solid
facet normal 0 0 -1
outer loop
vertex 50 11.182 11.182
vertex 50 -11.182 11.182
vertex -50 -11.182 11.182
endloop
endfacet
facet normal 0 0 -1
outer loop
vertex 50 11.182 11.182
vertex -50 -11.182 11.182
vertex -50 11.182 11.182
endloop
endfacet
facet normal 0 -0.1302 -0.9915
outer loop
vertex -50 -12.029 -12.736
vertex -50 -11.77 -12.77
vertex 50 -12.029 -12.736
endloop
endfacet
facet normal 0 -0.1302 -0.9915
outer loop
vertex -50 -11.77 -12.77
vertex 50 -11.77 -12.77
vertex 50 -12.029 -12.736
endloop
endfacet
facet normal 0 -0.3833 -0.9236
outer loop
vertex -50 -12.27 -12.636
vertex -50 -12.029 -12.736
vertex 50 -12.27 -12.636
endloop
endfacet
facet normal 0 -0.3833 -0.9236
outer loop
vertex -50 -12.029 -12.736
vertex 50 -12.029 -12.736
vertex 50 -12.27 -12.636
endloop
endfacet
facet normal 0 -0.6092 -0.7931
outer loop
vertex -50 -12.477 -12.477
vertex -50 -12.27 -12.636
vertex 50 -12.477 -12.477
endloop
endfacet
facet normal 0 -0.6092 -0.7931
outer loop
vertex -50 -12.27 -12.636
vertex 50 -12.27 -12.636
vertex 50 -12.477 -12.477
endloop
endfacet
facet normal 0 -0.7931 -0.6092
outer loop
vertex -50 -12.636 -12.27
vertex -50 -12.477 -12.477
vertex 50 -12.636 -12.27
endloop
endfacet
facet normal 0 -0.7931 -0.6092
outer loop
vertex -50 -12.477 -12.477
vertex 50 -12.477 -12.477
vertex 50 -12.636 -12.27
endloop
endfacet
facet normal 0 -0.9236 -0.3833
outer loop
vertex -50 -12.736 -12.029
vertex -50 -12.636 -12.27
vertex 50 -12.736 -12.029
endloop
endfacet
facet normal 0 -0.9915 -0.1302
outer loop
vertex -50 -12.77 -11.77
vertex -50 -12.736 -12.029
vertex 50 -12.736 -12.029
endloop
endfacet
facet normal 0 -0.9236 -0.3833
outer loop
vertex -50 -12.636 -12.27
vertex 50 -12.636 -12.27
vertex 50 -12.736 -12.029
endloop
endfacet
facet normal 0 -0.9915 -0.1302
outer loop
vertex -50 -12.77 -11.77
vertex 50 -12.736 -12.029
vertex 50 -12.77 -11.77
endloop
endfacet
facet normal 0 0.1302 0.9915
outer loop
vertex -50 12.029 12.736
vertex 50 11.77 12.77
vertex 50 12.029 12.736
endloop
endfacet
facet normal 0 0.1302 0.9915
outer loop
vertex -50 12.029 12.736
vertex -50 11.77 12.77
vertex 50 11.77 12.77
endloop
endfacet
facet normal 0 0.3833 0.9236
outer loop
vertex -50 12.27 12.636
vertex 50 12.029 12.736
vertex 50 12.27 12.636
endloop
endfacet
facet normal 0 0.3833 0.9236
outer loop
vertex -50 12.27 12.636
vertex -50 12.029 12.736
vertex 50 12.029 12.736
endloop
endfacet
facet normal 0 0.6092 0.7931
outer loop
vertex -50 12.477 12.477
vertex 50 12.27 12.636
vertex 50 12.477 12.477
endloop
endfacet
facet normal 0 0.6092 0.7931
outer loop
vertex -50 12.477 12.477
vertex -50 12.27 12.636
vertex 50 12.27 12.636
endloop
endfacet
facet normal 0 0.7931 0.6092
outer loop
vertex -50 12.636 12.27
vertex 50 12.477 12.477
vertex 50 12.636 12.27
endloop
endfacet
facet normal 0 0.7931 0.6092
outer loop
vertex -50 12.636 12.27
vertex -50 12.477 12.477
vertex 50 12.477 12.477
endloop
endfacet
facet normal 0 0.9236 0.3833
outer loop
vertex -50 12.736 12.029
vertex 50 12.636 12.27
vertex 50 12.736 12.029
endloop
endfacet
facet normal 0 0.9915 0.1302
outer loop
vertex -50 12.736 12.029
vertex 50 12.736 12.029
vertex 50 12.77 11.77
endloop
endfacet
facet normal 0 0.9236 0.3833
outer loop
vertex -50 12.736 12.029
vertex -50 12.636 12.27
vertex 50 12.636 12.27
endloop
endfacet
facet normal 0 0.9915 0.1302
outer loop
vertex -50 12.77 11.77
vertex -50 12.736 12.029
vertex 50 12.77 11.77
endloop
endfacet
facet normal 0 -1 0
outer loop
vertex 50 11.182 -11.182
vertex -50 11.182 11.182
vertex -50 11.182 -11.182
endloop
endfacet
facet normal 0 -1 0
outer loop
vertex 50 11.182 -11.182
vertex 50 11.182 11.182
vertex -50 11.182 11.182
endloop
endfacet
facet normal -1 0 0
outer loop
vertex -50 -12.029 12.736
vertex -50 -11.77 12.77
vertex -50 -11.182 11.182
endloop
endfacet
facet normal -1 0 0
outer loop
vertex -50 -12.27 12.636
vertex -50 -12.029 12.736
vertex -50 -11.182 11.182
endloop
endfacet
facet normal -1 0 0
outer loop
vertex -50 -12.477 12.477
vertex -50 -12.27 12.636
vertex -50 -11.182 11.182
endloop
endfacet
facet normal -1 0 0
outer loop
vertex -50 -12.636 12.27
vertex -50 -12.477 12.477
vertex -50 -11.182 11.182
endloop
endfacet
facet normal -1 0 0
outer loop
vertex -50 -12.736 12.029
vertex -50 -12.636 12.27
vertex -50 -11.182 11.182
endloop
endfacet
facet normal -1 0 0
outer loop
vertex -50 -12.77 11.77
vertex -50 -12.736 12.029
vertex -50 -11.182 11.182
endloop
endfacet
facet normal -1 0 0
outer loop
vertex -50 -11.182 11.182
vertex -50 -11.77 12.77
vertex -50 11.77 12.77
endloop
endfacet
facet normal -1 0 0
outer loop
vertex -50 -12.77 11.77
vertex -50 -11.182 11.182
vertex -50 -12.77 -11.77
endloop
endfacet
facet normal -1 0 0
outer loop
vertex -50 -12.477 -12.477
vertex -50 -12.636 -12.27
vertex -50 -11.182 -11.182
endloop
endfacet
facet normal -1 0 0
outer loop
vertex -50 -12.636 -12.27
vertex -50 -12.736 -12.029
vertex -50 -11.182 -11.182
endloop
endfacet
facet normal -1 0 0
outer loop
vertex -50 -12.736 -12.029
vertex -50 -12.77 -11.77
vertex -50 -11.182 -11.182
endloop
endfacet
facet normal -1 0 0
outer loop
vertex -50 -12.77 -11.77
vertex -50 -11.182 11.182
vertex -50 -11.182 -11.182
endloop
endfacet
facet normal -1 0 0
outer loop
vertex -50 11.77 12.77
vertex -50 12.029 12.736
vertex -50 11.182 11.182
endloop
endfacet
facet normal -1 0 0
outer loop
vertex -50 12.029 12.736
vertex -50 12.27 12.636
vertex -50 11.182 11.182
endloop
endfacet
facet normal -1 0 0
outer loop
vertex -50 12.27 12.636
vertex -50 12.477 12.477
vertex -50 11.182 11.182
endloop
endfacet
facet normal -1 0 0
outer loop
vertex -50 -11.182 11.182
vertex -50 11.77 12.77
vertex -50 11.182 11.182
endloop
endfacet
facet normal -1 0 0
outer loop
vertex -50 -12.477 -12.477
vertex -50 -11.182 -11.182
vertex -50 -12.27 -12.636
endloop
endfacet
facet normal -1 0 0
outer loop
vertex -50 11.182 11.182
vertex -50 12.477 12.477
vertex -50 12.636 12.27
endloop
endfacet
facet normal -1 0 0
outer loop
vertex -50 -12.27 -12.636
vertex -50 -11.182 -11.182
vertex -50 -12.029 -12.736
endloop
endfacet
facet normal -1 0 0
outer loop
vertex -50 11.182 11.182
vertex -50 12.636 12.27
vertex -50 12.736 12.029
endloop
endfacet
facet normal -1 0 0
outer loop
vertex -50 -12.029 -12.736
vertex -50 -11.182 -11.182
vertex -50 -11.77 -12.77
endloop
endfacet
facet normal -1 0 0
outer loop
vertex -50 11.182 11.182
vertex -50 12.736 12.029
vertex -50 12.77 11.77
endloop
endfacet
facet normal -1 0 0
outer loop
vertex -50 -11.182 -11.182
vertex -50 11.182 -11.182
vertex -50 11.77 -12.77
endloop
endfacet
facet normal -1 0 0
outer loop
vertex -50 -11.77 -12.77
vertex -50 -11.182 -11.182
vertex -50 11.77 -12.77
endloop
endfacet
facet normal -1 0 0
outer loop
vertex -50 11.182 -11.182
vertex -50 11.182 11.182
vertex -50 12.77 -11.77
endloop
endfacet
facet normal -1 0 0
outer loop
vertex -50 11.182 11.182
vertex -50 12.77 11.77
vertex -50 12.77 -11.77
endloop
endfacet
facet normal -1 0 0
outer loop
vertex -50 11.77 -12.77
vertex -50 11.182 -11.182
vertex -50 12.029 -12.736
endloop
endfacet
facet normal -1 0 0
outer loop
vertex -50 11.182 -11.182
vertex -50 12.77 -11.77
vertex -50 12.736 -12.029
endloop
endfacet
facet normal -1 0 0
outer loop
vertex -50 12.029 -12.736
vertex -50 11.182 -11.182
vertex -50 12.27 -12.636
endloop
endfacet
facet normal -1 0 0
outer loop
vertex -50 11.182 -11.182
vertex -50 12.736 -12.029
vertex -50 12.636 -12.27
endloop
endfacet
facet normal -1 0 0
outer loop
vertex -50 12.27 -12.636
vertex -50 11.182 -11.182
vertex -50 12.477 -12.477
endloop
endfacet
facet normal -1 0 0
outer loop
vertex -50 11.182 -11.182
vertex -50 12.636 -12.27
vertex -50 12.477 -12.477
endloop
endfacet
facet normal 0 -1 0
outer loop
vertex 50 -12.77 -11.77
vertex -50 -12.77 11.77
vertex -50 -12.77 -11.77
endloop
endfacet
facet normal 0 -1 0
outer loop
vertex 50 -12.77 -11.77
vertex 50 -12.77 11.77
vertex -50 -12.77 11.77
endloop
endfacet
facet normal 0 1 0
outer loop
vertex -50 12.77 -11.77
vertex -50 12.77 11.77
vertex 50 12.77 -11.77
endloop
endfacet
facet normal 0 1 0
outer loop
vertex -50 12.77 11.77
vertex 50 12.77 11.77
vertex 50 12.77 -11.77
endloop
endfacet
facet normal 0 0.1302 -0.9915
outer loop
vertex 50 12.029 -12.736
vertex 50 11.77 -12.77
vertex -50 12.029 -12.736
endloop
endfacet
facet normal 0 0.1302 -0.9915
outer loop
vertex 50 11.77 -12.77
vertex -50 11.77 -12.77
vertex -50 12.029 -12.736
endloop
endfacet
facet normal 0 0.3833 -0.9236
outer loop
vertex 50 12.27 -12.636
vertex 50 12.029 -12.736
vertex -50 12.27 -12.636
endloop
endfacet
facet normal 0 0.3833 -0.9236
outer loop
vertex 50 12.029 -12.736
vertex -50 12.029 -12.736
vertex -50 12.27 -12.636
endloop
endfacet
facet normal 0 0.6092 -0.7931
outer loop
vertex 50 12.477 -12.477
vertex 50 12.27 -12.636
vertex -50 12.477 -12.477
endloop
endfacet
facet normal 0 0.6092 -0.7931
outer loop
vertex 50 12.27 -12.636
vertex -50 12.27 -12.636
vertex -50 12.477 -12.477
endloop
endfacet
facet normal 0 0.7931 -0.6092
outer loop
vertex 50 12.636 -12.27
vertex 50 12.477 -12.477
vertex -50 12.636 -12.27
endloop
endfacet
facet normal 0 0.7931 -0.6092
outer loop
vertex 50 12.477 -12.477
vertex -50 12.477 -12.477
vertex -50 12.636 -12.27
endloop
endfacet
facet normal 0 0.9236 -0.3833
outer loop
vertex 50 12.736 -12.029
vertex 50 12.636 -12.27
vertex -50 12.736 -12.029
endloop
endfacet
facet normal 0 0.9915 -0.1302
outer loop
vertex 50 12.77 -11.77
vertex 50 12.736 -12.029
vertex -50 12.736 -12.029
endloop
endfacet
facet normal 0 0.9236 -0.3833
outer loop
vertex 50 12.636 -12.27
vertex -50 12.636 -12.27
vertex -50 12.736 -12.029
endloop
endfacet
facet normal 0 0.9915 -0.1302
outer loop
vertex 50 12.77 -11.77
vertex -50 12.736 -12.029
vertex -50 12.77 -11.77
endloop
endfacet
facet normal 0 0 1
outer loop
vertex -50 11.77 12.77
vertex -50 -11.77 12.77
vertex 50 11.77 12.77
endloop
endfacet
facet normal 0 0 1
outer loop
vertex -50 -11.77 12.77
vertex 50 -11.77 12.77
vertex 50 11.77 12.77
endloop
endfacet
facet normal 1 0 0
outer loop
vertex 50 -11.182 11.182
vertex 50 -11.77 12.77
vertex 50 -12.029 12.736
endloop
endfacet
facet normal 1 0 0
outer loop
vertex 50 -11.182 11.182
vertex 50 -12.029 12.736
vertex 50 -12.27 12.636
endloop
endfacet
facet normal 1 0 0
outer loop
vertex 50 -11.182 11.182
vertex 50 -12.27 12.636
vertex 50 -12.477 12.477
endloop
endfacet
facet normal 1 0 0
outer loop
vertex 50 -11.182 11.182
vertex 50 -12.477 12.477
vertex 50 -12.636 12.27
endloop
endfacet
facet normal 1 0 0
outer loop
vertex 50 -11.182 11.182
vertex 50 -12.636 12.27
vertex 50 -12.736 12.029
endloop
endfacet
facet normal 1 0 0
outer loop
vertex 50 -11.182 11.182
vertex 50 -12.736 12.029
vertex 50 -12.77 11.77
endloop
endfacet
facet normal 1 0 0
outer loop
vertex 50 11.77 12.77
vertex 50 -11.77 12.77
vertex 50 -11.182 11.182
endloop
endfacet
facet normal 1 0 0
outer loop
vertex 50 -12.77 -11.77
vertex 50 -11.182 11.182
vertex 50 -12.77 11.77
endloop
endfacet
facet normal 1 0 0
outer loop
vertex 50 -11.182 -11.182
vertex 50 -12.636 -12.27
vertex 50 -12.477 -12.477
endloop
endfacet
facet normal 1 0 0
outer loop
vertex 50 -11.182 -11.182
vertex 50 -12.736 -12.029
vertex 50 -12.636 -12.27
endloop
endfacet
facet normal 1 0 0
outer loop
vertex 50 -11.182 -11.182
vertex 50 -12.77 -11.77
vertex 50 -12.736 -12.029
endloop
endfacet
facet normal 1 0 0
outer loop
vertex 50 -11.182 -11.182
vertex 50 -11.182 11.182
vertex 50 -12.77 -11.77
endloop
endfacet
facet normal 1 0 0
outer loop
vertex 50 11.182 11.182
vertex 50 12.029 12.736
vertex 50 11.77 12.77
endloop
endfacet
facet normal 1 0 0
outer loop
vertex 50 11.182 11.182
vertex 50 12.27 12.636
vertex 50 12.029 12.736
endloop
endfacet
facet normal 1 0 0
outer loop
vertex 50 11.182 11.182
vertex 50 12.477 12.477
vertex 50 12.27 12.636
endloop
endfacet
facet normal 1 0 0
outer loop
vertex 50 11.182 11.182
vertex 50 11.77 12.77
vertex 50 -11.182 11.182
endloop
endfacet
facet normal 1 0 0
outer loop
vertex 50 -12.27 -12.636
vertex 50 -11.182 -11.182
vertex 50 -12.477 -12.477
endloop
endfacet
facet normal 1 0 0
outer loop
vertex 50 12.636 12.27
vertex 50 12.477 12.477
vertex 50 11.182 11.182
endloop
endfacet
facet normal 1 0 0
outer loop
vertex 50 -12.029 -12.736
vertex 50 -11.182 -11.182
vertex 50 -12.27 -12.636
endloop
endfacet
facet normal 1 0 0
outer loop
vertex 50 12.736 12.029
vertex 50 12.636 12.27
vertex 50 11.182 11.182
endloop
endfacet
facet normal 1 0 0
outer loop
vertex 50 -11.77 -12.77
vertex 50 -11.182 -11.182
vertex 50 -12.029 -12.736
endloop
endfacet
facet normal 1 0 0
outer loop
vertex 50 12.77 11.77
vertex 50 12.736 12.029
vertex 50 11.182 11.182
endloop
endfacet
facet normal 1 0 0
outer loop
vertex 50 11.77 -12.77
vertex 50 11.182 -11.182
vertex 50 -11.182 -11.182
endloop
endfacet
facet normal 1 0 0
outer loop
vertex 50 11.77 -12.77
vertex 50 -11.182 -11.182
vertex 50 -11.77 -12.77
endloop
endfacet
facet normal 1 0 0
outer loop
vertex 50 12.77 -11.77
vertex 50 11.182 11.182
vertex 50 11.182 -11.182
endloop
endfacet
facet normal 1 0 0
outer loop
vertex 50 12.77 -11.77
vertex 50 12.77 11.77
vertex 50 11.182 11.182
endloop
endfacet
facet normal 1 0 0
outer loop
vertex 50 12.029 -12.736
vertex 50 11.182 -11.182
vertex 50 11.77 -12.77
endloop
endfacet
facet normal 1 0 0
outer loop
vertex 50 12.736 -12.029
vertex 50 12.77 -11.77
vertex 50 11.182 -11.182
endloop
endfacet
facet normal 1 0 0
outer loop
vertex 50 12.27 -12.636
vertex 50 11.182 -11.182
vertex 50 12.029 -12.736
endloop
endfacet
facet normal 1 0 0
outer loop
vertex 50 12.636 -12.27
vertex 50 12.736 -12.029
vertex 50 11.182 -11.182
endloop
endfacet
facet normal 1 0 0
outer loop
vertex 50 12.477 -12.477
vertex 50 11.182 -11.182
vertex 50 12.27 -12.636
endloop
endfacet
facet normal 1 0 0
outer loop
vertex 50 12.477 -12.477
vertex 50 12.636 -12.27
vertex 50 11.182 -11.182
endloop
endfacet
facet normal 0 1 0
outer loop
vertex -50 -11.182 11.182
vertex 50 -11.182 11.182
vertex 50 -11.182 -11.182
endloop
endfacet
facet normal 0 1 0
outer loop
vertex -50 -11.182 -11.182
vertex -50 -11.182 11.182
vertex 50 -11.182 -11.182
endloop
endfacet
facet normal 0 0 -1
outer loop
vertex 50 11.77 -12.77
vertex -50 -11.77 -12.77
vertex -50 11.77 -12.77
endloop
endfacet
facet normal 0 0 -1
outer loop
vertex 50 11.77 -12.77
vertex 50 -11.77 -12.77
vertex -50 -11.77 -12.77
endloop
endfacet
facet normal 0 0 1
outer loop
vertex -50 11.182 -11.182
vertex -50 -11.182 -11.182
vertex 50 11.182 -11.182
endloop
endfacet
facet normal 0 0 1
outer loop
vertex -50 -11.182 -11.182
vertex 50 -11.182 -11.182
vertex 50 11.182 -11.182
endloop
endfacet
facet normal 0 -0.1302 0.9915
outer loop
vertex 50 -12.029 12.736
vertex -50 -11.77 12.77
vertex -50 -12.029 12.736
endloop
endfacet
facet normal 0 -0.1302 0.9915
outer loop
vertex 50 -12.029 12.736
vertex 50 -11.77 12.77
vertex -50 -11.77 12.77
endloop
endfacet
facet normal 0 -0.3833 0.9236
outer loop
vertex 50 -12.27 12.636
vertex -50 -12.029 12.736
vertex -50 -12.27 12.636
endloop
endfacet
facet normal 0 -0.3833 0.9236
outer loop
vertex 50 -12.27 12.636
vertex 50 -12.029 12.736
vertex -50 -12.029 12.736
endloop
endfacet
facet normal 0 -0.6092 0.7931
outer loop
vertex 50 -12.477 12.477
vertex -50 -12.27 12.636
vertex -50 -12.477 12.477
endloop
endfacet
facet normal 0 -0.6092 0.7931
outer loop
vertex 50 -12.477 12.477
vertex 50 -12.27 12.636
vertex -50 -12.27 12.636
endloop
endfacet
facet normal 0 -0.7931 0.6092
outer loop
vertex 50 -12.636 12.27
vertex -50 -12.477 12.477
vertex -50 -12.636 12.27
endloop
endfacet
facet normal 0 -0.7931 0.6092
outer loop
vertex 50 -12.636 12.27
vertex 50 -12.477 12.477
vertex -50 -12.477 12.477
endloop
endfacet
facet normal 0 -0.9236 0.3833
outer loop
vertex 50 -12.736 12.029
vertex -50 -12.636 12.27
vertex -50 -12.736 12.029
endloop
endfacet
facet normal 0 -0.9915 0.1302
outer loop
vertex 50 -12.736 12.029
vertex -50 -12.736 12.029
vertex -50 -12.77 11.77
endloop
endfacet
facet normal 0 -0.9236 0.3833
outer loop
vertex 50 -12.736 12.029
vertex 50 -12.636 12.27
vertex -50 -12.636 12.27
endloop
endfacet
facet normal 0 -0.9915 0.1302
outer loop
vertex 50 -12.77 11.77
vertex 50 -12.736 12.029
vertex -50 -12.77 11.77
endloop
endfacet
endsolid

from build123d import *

# Parameters (mm, degrees)
SKETCH2_W                = 25.54
SKETCH2_H                = 25.54
SKETCH2_W_2              = 22.365
SKETCH2_H_2              = 22.365
BOSS_EXTRUDE1_DEPTH      = 50
BOSS_EXTRUDE1_DEPTH_BACK = 50
FILLET1_R                = 1


with BuildPart() as part:
    # Sketch2 → Boss-Extrude1 (new body, two sides)
    with BuildSketch(Plane(origin=(0, 0, 0), x_dir=(0, 0, -1), z_dir=(1, 0, 0))) as boss_extrude1_sk:
        Rectangle(SKETCH2_W, SKETCH2_H)
        Rectangle(SKETCH2_W_2, SKETCH2_H_2, mode=Mode.SUBTRACT)
    extrude(amount=BOSS_EXTRUDE1_DEPTH)
    extrude(boss_extrude1_sk.sketch, amount=-BOSS_EXTRUDE1_DEPTH_BACK)

    # Fillet1
    fillet1_edges = [part.edges().sort_by_distance(p)[0] for p in [
        (0, -12.77, -12.77),
        (0, -12.77, 12.77),
        (0, 12.77, 12.77),
        (0, 12.77, -12.77),
    ]]
    fillet(fillet1_edges, radius=FILLET1_R)


solid = part.part
